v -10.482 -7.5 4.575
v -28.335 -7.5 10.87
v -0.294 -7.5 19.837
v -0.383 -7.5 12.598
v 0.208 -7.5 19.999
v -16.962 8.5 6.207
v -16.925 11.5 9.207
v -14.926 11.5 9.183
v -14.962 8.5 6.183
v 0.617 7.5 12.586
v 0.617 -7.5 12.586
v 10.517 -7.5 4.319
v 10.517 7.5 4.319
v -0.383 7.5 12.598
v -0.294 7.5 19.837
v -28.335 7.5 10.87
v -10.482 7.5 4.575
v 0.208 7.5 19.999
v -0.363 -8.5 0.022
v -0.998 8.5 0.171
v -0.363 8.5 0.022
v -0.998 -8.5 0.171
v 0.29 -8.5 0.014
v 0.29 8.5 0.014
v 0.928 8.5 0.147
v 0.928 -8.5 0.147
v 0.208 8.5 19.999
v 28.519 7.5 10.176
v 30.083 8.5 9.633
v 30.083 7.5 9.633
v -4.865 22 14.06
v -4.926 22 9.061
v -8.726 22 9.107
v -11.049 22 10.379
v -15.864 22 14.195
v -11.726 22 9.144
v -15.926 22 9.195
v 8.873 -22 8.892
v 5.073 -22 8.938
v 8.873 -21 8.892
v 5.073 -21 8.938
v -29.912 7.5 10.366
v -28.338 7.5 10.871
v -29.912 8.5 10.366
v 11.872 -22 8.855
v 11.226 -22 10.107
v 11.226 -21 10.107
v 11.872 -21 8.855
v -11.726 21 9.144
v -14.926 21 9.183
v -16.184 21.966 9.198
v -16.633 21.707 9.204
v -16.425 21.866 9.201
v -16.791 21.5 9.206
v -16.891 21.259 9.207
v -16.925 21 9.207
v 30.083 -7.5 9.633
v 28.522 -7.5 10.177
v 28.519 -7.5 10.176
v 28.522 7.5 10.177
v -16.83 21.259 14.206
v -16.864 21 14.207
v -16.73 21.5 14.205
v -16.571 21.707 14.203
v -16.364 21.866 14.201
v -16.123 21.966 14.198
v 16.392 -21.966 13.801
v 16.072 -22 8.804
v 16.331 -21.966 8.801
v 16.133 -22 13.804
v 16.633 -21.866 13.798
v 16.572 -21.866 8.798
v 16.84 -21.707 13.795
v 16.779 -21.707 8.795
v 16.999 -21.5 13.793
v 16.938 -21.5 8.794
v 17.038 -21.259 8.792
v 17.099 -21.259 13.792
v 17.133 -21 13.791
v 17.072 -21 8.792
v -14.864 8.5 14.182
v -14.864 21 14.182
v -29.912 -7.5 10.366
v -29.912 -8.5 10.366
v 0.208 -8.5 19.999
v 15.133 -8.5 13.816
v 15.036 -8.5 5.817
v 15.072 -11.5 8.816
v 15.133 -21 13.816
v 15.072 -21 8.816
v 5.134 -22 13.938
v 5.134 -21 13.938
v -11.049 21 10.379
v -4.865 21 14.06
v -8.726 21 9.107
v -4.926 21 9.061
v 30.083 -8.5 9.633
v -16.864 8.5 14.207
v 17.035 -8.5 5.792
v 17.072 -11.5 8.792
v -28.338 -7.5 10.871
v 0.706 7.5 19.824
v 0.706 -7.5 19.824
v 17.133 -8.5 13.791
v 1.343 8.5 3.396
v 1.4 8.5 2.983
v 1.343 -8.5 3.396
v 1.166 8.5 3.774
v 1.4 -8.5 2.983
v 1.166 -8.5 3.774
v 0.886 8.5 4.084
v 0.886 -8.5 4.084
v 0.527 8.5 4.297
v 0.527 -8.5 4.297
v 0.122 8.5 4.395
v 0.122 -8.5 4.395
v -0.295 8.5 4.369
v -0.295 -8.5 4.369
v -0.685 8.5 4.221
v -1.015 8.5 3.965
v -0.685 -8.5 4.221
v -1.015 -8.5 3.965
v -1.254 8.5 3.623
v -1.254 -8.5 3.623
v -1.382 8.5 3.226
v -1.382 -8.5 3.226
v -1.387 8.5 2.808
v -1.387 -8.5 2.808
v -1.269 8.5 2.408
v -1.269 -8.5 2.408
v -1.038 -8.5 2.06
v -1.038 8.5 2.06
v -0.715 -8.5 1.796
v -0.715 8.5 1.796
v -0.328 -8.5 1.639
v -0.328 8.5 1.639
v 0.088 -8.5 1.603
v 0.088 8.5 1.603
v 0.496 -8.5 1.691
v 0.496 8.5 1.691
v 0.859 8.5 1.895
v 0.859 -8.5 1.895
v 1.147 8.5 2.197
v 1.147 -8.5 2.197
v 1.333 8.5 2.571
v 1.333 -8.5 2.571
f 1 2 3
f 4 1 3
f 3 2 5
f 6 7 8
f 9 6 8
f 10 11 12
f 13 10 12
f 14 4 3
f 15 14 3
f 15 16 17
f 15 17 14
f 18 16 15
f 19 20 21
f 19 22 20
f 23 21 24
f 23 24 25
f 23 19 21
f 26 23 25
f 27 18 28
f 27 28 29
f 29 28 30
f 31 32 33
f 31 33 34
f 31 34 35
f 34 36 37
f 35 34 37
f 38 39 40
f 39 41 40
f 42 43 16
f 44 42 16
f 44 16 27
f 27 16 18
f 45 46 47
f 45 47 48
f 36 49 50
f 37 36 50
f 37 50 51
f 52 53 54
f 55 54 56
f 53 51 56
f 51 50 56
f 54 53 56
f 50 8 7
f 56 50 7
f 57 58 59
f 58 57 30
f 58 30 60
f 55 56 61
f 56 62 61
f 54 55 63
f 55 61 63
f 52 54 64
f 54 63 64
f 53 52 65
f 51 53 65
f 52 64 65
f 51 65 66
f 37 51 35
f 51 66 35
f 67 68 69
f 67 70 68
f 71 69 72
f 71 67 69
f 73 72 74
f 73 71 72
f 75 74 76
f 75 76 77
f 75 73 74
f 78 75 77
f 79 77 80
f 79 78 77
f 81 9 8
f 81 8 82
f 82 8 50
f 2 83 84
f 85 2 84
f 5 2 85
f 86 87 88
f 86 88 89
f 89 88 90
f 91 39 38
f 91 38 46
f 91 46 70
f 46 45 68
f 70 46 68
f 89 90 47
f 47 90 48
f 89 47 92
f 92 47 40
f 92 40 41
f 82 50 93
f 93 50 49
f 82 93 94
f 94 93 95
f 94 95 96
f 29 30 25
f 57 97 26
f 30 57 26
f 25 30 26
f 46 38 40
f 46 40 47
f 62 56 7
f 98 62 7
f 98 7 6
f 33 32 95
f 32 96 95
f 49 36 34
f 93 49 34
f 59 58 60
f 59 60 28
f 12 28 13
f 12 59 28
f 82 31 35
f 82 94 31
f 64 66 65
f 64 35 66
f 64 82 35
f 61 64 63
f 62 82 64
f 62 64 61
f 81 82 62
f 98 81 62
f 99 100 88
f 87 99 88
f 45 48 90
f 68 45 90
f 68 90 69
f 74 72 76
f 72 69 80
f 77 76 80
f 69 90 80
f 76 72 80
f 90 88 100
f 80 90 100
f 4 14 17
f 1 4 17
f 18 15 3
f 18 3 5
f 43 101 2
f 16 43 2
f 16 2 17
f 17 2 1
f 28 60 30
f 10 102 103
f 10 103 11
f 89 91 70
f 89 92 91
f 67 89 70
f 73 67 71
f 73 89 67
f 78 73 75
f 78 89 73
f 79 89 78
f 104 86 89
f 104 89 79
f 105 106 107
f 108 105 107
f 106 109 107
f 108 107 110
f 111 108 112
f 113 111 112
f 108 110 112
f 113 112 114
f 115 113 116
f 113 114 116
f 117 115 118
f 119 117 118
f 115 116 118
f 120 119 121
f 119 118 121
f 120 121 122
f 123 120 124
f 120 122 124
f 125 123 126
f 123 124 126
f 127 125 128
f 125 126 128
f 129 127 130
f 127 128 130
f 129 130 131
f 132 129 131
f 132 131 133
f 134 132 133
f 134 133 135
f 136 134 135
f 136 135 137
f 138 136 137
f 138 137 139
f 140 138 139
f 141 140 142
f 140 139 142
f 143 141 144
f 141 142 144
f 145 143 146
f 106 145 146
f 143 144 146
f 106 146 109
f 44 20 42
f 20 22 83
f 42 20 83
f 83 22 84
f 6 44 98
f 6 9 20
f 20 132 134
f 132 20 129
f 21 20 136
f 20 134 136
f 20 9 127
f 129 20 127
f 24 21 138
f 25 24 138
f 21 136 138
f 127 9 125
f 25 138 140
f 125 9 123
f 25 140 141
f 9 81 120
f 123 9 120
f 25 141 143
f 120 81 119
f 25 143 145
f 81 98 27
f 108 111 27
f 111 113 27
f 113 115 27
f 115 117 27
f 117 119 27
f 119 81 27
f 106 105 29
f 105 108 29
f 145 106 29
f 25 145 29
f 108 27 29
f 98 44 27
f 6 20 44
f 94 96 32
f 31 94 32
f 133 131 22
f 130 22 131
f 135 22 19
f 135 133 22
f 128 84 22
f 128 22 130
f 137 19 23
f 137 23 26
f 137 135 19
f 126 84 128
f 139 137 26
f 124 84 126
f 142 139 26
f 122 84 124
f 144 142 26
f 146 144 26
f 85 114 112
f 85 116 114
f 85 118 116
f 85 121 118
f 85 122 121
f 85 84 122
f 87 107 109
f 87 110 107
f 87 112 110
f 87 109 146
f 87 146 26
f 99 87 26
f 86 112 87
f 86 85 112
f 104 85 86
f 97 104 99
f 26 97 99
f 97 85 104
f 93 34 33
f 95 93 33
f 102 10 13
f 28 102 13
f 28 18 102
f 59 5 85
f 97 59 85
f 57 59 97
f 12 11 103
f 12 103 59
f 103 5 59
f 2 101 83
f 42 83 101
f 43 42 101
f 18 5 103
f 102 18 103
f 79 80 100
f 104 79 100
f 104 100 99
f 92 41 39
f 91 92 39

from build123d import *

# Parameters (mm, degrees)
PAD023_DEPTH        = 15
SKETCH047_R         = 1.4
POCKET020_DEPTH     = 15
PAD018_DEPTH        = 15
PAD020_DEPTH        = 1
PAD019_DEPTH        = 1
SKETCH049_R         = 1.4
POCKET023_DEPTH     = 17.001
PAD022_DEPTH        = 5
PAD021_DEPTH        = 5
CHAMFER009_SIZE     = 3
CHAMFER010_SIZE     = 3
FILLET014_R         = 1
FILLET013_R         = 1
POCKET022_DEPTH     = 1
POCKET021_DEPTH     = 1
BODY007_PITCH_ANGLE = 0.7


with BuildPart() as part:
    # Sketch051 → Pad023 (new body)
    with BuildSketch(Plane.XZ.offset(7.5)):
        with BuildLine():
            Line((0.962959, 0.158748), (30, 10))
            Line((30, 10), (28.432297, 10.524546))
            Line((28.432297, 10.524546), (10.5, 4.446921))
            Line((0, 13), (10.5, 4.446921))
            Line((0, 13), (-10.5, 4.446921))
            Line((-28.432297, 10.524546), (-10.5, 4.446921))
            Line((-30, 10), (-28.432297, 10.524546))
            Line((-0.962959, 0.158748), (-30, 10))
            ThreePointArc((-0.962959, 0.158748), (0, 0), (0.962959, 0.158748))
        make_face()
    extrude(amount=-PAD023_DEPTH)

    # Sketch047 → Pocket020 (cut)
    with BuildSketch(Plane.XZ.offset(7.5)):
        with Locations((0, 3)):
            Circle(SKETCH047_R)
    extrude(amount=-POCKET020_DEPTH, mode=Mode.SUBTRACT)

    # Sketch054 (on Face4 of Pocket020) → Pad018 (join)
    with BuildSketch(Plane.XZ.offset(7.5)):
        with BuildLine():
            Line((-0.5, 5.95804), (-0.5, 19.831731))
            Line((-0.5, 19.831731), (0, 20))
            Line((0, 20), (0.5, 19.831731))
            Line((0.5, 19.831731), (0.5, 5.95804))
            ThreePointArc((0.5, 5.95804), (0, 6), (-0.5, 5.95804))
        make_face()
    extrude(amount=-PAD018_DEPTH)

    # Sketch050 (on Face4 of Pad018) → Pad020 (join)
    with BuildSketch(Plane.XZ.offset(7.5)):
        with BuildLine():
            ThreePointArc((-0.962959, 0.158748), (0, 0), (0.962959, 0.158748))
            Line((30, 10), (0.962959, 0.158748))
            Line((0, 20), (30, 10))
            Line((-30, 10), (0, 20))
            Line((-0.962959, 0.158748), (-30, 10))
        make_face()
    extrude(amount=PAD020_DEPTH)

    # Sketch053 (on Face4 of Pad018) → Pad019 (join)
    with BuildSketch(Plane.XZ.offset(-7.5)):
        with BuildLine():
            ThreePointArc((-0.962959, 0.158748), (0, 0), (0.962959, 0.158748))
            Line((30, 10), (0.962959, 0.158748))
            Line((0, 20), (30, 10))
            Line((-30, 10), (0, 20))
            Line((-0.962959, 0.158748), (-30, 10))
        make_face()
    extrude(amount=-PAD019_DEPTH)

    # Sketch049 (on Face12 of Pad019) → Pocket023 (cut, through all)
    with BuildSketch(Plane.XZ.offset(8.5)):
        with Locations((0, 3)):
            Circle(SKETCH049_R)
    extrude(amount=-POCKET023_DEPTH, mode=Mode.SUBTRACT)

    # Sketch048 → Pad022 (join)
    with BuildSketch(Plane.XY.offset(9)):
        Polygon((5, -21), (5, -22), (17, -22), (17, -8.5), (15, -8.5), (15, -21), align=None)
    extrude(amount=PAD022_DEPTH)

    # Sketch055 → Pad021 (join)
    with BuildSketch(Plane(origin=(0, 0, 9), x_dir=(-1, 0, 0), z_dir=(0, 0, 1))):
        Polygon((5, -21), (5, -22), (17, -22), (17, -8.5), (15, -8.5), (15, -21), align=None)
    extrude(amount=PAD021_DEPTH)

    # Chamfer009
    chamfer009_edges = [part.edges().sort_by_distance(p)[0] for p in [
        (16, -8.5, 9),
    ]]
    chamfer(chamfer009_edges, length=CHAMFER009_SIZE)

    # Chamfer010
    chamfer010_edges = [part.edges().sort_by_distance(p)[0] for p in [
        (-16, 8.5, 9),
    ]]
    chamfer(chamfer010_edges, length=CHAMFER010_SIZE)

    # Fillet014
    fillet014_edges = [part.edges().sort_by_distance(p)[0] for p in [
        (17, -22, 11.5),
    ]]
    fillet(fillet014_edges, radius=FILLET014_R)

    # Fillet013
    fillet013_edges = [part.edges().sort_by_distance(p)[0] for p in [
        (-17, 22, 11.5),
    ]]
    fillet(fillet013_edges, radius=FILLET013_R)

    # Sketch056 (on Face52 of Fillet013) → Pocket022 (cut)
    with BuildSketch(Plane.XZ.offset(22)):
        Polygon((8.8, 9), (11.138789, 10.243556), (11.8, 9), align=None)
    extrude(amount=-POCKET022_DEPTH, mode=Mode.SUBTRACT)

    # Sketch052 (on Face7 of Pocket022) → Pocket021 (cut)
    with BuildSketch(Plane(origin=(0, 22, 0), x_dir=(1, 0, 0), z_dir=(0, 1, 0))):
        Polygon((-11.8, -9), (-11.138789, -10.243556), (-8.8, -9), align=None)
    extrude(amount=-POCKET021_DEPTH, mode=Mode.SUBTRACT)


with BuildPart() as part_1:
    # Body007 pitch: moved
    add(part.part.rotate(Axis((0, 0, 0), (0, 1, 0)), BODY007_PITCH_ANGLE))


with BuildPart() as part_2:
    # Body007 placement: moved
    add(part_1.part.moved(Location((-0.036651, 0, 0.000224))))


solid = part_2.part
